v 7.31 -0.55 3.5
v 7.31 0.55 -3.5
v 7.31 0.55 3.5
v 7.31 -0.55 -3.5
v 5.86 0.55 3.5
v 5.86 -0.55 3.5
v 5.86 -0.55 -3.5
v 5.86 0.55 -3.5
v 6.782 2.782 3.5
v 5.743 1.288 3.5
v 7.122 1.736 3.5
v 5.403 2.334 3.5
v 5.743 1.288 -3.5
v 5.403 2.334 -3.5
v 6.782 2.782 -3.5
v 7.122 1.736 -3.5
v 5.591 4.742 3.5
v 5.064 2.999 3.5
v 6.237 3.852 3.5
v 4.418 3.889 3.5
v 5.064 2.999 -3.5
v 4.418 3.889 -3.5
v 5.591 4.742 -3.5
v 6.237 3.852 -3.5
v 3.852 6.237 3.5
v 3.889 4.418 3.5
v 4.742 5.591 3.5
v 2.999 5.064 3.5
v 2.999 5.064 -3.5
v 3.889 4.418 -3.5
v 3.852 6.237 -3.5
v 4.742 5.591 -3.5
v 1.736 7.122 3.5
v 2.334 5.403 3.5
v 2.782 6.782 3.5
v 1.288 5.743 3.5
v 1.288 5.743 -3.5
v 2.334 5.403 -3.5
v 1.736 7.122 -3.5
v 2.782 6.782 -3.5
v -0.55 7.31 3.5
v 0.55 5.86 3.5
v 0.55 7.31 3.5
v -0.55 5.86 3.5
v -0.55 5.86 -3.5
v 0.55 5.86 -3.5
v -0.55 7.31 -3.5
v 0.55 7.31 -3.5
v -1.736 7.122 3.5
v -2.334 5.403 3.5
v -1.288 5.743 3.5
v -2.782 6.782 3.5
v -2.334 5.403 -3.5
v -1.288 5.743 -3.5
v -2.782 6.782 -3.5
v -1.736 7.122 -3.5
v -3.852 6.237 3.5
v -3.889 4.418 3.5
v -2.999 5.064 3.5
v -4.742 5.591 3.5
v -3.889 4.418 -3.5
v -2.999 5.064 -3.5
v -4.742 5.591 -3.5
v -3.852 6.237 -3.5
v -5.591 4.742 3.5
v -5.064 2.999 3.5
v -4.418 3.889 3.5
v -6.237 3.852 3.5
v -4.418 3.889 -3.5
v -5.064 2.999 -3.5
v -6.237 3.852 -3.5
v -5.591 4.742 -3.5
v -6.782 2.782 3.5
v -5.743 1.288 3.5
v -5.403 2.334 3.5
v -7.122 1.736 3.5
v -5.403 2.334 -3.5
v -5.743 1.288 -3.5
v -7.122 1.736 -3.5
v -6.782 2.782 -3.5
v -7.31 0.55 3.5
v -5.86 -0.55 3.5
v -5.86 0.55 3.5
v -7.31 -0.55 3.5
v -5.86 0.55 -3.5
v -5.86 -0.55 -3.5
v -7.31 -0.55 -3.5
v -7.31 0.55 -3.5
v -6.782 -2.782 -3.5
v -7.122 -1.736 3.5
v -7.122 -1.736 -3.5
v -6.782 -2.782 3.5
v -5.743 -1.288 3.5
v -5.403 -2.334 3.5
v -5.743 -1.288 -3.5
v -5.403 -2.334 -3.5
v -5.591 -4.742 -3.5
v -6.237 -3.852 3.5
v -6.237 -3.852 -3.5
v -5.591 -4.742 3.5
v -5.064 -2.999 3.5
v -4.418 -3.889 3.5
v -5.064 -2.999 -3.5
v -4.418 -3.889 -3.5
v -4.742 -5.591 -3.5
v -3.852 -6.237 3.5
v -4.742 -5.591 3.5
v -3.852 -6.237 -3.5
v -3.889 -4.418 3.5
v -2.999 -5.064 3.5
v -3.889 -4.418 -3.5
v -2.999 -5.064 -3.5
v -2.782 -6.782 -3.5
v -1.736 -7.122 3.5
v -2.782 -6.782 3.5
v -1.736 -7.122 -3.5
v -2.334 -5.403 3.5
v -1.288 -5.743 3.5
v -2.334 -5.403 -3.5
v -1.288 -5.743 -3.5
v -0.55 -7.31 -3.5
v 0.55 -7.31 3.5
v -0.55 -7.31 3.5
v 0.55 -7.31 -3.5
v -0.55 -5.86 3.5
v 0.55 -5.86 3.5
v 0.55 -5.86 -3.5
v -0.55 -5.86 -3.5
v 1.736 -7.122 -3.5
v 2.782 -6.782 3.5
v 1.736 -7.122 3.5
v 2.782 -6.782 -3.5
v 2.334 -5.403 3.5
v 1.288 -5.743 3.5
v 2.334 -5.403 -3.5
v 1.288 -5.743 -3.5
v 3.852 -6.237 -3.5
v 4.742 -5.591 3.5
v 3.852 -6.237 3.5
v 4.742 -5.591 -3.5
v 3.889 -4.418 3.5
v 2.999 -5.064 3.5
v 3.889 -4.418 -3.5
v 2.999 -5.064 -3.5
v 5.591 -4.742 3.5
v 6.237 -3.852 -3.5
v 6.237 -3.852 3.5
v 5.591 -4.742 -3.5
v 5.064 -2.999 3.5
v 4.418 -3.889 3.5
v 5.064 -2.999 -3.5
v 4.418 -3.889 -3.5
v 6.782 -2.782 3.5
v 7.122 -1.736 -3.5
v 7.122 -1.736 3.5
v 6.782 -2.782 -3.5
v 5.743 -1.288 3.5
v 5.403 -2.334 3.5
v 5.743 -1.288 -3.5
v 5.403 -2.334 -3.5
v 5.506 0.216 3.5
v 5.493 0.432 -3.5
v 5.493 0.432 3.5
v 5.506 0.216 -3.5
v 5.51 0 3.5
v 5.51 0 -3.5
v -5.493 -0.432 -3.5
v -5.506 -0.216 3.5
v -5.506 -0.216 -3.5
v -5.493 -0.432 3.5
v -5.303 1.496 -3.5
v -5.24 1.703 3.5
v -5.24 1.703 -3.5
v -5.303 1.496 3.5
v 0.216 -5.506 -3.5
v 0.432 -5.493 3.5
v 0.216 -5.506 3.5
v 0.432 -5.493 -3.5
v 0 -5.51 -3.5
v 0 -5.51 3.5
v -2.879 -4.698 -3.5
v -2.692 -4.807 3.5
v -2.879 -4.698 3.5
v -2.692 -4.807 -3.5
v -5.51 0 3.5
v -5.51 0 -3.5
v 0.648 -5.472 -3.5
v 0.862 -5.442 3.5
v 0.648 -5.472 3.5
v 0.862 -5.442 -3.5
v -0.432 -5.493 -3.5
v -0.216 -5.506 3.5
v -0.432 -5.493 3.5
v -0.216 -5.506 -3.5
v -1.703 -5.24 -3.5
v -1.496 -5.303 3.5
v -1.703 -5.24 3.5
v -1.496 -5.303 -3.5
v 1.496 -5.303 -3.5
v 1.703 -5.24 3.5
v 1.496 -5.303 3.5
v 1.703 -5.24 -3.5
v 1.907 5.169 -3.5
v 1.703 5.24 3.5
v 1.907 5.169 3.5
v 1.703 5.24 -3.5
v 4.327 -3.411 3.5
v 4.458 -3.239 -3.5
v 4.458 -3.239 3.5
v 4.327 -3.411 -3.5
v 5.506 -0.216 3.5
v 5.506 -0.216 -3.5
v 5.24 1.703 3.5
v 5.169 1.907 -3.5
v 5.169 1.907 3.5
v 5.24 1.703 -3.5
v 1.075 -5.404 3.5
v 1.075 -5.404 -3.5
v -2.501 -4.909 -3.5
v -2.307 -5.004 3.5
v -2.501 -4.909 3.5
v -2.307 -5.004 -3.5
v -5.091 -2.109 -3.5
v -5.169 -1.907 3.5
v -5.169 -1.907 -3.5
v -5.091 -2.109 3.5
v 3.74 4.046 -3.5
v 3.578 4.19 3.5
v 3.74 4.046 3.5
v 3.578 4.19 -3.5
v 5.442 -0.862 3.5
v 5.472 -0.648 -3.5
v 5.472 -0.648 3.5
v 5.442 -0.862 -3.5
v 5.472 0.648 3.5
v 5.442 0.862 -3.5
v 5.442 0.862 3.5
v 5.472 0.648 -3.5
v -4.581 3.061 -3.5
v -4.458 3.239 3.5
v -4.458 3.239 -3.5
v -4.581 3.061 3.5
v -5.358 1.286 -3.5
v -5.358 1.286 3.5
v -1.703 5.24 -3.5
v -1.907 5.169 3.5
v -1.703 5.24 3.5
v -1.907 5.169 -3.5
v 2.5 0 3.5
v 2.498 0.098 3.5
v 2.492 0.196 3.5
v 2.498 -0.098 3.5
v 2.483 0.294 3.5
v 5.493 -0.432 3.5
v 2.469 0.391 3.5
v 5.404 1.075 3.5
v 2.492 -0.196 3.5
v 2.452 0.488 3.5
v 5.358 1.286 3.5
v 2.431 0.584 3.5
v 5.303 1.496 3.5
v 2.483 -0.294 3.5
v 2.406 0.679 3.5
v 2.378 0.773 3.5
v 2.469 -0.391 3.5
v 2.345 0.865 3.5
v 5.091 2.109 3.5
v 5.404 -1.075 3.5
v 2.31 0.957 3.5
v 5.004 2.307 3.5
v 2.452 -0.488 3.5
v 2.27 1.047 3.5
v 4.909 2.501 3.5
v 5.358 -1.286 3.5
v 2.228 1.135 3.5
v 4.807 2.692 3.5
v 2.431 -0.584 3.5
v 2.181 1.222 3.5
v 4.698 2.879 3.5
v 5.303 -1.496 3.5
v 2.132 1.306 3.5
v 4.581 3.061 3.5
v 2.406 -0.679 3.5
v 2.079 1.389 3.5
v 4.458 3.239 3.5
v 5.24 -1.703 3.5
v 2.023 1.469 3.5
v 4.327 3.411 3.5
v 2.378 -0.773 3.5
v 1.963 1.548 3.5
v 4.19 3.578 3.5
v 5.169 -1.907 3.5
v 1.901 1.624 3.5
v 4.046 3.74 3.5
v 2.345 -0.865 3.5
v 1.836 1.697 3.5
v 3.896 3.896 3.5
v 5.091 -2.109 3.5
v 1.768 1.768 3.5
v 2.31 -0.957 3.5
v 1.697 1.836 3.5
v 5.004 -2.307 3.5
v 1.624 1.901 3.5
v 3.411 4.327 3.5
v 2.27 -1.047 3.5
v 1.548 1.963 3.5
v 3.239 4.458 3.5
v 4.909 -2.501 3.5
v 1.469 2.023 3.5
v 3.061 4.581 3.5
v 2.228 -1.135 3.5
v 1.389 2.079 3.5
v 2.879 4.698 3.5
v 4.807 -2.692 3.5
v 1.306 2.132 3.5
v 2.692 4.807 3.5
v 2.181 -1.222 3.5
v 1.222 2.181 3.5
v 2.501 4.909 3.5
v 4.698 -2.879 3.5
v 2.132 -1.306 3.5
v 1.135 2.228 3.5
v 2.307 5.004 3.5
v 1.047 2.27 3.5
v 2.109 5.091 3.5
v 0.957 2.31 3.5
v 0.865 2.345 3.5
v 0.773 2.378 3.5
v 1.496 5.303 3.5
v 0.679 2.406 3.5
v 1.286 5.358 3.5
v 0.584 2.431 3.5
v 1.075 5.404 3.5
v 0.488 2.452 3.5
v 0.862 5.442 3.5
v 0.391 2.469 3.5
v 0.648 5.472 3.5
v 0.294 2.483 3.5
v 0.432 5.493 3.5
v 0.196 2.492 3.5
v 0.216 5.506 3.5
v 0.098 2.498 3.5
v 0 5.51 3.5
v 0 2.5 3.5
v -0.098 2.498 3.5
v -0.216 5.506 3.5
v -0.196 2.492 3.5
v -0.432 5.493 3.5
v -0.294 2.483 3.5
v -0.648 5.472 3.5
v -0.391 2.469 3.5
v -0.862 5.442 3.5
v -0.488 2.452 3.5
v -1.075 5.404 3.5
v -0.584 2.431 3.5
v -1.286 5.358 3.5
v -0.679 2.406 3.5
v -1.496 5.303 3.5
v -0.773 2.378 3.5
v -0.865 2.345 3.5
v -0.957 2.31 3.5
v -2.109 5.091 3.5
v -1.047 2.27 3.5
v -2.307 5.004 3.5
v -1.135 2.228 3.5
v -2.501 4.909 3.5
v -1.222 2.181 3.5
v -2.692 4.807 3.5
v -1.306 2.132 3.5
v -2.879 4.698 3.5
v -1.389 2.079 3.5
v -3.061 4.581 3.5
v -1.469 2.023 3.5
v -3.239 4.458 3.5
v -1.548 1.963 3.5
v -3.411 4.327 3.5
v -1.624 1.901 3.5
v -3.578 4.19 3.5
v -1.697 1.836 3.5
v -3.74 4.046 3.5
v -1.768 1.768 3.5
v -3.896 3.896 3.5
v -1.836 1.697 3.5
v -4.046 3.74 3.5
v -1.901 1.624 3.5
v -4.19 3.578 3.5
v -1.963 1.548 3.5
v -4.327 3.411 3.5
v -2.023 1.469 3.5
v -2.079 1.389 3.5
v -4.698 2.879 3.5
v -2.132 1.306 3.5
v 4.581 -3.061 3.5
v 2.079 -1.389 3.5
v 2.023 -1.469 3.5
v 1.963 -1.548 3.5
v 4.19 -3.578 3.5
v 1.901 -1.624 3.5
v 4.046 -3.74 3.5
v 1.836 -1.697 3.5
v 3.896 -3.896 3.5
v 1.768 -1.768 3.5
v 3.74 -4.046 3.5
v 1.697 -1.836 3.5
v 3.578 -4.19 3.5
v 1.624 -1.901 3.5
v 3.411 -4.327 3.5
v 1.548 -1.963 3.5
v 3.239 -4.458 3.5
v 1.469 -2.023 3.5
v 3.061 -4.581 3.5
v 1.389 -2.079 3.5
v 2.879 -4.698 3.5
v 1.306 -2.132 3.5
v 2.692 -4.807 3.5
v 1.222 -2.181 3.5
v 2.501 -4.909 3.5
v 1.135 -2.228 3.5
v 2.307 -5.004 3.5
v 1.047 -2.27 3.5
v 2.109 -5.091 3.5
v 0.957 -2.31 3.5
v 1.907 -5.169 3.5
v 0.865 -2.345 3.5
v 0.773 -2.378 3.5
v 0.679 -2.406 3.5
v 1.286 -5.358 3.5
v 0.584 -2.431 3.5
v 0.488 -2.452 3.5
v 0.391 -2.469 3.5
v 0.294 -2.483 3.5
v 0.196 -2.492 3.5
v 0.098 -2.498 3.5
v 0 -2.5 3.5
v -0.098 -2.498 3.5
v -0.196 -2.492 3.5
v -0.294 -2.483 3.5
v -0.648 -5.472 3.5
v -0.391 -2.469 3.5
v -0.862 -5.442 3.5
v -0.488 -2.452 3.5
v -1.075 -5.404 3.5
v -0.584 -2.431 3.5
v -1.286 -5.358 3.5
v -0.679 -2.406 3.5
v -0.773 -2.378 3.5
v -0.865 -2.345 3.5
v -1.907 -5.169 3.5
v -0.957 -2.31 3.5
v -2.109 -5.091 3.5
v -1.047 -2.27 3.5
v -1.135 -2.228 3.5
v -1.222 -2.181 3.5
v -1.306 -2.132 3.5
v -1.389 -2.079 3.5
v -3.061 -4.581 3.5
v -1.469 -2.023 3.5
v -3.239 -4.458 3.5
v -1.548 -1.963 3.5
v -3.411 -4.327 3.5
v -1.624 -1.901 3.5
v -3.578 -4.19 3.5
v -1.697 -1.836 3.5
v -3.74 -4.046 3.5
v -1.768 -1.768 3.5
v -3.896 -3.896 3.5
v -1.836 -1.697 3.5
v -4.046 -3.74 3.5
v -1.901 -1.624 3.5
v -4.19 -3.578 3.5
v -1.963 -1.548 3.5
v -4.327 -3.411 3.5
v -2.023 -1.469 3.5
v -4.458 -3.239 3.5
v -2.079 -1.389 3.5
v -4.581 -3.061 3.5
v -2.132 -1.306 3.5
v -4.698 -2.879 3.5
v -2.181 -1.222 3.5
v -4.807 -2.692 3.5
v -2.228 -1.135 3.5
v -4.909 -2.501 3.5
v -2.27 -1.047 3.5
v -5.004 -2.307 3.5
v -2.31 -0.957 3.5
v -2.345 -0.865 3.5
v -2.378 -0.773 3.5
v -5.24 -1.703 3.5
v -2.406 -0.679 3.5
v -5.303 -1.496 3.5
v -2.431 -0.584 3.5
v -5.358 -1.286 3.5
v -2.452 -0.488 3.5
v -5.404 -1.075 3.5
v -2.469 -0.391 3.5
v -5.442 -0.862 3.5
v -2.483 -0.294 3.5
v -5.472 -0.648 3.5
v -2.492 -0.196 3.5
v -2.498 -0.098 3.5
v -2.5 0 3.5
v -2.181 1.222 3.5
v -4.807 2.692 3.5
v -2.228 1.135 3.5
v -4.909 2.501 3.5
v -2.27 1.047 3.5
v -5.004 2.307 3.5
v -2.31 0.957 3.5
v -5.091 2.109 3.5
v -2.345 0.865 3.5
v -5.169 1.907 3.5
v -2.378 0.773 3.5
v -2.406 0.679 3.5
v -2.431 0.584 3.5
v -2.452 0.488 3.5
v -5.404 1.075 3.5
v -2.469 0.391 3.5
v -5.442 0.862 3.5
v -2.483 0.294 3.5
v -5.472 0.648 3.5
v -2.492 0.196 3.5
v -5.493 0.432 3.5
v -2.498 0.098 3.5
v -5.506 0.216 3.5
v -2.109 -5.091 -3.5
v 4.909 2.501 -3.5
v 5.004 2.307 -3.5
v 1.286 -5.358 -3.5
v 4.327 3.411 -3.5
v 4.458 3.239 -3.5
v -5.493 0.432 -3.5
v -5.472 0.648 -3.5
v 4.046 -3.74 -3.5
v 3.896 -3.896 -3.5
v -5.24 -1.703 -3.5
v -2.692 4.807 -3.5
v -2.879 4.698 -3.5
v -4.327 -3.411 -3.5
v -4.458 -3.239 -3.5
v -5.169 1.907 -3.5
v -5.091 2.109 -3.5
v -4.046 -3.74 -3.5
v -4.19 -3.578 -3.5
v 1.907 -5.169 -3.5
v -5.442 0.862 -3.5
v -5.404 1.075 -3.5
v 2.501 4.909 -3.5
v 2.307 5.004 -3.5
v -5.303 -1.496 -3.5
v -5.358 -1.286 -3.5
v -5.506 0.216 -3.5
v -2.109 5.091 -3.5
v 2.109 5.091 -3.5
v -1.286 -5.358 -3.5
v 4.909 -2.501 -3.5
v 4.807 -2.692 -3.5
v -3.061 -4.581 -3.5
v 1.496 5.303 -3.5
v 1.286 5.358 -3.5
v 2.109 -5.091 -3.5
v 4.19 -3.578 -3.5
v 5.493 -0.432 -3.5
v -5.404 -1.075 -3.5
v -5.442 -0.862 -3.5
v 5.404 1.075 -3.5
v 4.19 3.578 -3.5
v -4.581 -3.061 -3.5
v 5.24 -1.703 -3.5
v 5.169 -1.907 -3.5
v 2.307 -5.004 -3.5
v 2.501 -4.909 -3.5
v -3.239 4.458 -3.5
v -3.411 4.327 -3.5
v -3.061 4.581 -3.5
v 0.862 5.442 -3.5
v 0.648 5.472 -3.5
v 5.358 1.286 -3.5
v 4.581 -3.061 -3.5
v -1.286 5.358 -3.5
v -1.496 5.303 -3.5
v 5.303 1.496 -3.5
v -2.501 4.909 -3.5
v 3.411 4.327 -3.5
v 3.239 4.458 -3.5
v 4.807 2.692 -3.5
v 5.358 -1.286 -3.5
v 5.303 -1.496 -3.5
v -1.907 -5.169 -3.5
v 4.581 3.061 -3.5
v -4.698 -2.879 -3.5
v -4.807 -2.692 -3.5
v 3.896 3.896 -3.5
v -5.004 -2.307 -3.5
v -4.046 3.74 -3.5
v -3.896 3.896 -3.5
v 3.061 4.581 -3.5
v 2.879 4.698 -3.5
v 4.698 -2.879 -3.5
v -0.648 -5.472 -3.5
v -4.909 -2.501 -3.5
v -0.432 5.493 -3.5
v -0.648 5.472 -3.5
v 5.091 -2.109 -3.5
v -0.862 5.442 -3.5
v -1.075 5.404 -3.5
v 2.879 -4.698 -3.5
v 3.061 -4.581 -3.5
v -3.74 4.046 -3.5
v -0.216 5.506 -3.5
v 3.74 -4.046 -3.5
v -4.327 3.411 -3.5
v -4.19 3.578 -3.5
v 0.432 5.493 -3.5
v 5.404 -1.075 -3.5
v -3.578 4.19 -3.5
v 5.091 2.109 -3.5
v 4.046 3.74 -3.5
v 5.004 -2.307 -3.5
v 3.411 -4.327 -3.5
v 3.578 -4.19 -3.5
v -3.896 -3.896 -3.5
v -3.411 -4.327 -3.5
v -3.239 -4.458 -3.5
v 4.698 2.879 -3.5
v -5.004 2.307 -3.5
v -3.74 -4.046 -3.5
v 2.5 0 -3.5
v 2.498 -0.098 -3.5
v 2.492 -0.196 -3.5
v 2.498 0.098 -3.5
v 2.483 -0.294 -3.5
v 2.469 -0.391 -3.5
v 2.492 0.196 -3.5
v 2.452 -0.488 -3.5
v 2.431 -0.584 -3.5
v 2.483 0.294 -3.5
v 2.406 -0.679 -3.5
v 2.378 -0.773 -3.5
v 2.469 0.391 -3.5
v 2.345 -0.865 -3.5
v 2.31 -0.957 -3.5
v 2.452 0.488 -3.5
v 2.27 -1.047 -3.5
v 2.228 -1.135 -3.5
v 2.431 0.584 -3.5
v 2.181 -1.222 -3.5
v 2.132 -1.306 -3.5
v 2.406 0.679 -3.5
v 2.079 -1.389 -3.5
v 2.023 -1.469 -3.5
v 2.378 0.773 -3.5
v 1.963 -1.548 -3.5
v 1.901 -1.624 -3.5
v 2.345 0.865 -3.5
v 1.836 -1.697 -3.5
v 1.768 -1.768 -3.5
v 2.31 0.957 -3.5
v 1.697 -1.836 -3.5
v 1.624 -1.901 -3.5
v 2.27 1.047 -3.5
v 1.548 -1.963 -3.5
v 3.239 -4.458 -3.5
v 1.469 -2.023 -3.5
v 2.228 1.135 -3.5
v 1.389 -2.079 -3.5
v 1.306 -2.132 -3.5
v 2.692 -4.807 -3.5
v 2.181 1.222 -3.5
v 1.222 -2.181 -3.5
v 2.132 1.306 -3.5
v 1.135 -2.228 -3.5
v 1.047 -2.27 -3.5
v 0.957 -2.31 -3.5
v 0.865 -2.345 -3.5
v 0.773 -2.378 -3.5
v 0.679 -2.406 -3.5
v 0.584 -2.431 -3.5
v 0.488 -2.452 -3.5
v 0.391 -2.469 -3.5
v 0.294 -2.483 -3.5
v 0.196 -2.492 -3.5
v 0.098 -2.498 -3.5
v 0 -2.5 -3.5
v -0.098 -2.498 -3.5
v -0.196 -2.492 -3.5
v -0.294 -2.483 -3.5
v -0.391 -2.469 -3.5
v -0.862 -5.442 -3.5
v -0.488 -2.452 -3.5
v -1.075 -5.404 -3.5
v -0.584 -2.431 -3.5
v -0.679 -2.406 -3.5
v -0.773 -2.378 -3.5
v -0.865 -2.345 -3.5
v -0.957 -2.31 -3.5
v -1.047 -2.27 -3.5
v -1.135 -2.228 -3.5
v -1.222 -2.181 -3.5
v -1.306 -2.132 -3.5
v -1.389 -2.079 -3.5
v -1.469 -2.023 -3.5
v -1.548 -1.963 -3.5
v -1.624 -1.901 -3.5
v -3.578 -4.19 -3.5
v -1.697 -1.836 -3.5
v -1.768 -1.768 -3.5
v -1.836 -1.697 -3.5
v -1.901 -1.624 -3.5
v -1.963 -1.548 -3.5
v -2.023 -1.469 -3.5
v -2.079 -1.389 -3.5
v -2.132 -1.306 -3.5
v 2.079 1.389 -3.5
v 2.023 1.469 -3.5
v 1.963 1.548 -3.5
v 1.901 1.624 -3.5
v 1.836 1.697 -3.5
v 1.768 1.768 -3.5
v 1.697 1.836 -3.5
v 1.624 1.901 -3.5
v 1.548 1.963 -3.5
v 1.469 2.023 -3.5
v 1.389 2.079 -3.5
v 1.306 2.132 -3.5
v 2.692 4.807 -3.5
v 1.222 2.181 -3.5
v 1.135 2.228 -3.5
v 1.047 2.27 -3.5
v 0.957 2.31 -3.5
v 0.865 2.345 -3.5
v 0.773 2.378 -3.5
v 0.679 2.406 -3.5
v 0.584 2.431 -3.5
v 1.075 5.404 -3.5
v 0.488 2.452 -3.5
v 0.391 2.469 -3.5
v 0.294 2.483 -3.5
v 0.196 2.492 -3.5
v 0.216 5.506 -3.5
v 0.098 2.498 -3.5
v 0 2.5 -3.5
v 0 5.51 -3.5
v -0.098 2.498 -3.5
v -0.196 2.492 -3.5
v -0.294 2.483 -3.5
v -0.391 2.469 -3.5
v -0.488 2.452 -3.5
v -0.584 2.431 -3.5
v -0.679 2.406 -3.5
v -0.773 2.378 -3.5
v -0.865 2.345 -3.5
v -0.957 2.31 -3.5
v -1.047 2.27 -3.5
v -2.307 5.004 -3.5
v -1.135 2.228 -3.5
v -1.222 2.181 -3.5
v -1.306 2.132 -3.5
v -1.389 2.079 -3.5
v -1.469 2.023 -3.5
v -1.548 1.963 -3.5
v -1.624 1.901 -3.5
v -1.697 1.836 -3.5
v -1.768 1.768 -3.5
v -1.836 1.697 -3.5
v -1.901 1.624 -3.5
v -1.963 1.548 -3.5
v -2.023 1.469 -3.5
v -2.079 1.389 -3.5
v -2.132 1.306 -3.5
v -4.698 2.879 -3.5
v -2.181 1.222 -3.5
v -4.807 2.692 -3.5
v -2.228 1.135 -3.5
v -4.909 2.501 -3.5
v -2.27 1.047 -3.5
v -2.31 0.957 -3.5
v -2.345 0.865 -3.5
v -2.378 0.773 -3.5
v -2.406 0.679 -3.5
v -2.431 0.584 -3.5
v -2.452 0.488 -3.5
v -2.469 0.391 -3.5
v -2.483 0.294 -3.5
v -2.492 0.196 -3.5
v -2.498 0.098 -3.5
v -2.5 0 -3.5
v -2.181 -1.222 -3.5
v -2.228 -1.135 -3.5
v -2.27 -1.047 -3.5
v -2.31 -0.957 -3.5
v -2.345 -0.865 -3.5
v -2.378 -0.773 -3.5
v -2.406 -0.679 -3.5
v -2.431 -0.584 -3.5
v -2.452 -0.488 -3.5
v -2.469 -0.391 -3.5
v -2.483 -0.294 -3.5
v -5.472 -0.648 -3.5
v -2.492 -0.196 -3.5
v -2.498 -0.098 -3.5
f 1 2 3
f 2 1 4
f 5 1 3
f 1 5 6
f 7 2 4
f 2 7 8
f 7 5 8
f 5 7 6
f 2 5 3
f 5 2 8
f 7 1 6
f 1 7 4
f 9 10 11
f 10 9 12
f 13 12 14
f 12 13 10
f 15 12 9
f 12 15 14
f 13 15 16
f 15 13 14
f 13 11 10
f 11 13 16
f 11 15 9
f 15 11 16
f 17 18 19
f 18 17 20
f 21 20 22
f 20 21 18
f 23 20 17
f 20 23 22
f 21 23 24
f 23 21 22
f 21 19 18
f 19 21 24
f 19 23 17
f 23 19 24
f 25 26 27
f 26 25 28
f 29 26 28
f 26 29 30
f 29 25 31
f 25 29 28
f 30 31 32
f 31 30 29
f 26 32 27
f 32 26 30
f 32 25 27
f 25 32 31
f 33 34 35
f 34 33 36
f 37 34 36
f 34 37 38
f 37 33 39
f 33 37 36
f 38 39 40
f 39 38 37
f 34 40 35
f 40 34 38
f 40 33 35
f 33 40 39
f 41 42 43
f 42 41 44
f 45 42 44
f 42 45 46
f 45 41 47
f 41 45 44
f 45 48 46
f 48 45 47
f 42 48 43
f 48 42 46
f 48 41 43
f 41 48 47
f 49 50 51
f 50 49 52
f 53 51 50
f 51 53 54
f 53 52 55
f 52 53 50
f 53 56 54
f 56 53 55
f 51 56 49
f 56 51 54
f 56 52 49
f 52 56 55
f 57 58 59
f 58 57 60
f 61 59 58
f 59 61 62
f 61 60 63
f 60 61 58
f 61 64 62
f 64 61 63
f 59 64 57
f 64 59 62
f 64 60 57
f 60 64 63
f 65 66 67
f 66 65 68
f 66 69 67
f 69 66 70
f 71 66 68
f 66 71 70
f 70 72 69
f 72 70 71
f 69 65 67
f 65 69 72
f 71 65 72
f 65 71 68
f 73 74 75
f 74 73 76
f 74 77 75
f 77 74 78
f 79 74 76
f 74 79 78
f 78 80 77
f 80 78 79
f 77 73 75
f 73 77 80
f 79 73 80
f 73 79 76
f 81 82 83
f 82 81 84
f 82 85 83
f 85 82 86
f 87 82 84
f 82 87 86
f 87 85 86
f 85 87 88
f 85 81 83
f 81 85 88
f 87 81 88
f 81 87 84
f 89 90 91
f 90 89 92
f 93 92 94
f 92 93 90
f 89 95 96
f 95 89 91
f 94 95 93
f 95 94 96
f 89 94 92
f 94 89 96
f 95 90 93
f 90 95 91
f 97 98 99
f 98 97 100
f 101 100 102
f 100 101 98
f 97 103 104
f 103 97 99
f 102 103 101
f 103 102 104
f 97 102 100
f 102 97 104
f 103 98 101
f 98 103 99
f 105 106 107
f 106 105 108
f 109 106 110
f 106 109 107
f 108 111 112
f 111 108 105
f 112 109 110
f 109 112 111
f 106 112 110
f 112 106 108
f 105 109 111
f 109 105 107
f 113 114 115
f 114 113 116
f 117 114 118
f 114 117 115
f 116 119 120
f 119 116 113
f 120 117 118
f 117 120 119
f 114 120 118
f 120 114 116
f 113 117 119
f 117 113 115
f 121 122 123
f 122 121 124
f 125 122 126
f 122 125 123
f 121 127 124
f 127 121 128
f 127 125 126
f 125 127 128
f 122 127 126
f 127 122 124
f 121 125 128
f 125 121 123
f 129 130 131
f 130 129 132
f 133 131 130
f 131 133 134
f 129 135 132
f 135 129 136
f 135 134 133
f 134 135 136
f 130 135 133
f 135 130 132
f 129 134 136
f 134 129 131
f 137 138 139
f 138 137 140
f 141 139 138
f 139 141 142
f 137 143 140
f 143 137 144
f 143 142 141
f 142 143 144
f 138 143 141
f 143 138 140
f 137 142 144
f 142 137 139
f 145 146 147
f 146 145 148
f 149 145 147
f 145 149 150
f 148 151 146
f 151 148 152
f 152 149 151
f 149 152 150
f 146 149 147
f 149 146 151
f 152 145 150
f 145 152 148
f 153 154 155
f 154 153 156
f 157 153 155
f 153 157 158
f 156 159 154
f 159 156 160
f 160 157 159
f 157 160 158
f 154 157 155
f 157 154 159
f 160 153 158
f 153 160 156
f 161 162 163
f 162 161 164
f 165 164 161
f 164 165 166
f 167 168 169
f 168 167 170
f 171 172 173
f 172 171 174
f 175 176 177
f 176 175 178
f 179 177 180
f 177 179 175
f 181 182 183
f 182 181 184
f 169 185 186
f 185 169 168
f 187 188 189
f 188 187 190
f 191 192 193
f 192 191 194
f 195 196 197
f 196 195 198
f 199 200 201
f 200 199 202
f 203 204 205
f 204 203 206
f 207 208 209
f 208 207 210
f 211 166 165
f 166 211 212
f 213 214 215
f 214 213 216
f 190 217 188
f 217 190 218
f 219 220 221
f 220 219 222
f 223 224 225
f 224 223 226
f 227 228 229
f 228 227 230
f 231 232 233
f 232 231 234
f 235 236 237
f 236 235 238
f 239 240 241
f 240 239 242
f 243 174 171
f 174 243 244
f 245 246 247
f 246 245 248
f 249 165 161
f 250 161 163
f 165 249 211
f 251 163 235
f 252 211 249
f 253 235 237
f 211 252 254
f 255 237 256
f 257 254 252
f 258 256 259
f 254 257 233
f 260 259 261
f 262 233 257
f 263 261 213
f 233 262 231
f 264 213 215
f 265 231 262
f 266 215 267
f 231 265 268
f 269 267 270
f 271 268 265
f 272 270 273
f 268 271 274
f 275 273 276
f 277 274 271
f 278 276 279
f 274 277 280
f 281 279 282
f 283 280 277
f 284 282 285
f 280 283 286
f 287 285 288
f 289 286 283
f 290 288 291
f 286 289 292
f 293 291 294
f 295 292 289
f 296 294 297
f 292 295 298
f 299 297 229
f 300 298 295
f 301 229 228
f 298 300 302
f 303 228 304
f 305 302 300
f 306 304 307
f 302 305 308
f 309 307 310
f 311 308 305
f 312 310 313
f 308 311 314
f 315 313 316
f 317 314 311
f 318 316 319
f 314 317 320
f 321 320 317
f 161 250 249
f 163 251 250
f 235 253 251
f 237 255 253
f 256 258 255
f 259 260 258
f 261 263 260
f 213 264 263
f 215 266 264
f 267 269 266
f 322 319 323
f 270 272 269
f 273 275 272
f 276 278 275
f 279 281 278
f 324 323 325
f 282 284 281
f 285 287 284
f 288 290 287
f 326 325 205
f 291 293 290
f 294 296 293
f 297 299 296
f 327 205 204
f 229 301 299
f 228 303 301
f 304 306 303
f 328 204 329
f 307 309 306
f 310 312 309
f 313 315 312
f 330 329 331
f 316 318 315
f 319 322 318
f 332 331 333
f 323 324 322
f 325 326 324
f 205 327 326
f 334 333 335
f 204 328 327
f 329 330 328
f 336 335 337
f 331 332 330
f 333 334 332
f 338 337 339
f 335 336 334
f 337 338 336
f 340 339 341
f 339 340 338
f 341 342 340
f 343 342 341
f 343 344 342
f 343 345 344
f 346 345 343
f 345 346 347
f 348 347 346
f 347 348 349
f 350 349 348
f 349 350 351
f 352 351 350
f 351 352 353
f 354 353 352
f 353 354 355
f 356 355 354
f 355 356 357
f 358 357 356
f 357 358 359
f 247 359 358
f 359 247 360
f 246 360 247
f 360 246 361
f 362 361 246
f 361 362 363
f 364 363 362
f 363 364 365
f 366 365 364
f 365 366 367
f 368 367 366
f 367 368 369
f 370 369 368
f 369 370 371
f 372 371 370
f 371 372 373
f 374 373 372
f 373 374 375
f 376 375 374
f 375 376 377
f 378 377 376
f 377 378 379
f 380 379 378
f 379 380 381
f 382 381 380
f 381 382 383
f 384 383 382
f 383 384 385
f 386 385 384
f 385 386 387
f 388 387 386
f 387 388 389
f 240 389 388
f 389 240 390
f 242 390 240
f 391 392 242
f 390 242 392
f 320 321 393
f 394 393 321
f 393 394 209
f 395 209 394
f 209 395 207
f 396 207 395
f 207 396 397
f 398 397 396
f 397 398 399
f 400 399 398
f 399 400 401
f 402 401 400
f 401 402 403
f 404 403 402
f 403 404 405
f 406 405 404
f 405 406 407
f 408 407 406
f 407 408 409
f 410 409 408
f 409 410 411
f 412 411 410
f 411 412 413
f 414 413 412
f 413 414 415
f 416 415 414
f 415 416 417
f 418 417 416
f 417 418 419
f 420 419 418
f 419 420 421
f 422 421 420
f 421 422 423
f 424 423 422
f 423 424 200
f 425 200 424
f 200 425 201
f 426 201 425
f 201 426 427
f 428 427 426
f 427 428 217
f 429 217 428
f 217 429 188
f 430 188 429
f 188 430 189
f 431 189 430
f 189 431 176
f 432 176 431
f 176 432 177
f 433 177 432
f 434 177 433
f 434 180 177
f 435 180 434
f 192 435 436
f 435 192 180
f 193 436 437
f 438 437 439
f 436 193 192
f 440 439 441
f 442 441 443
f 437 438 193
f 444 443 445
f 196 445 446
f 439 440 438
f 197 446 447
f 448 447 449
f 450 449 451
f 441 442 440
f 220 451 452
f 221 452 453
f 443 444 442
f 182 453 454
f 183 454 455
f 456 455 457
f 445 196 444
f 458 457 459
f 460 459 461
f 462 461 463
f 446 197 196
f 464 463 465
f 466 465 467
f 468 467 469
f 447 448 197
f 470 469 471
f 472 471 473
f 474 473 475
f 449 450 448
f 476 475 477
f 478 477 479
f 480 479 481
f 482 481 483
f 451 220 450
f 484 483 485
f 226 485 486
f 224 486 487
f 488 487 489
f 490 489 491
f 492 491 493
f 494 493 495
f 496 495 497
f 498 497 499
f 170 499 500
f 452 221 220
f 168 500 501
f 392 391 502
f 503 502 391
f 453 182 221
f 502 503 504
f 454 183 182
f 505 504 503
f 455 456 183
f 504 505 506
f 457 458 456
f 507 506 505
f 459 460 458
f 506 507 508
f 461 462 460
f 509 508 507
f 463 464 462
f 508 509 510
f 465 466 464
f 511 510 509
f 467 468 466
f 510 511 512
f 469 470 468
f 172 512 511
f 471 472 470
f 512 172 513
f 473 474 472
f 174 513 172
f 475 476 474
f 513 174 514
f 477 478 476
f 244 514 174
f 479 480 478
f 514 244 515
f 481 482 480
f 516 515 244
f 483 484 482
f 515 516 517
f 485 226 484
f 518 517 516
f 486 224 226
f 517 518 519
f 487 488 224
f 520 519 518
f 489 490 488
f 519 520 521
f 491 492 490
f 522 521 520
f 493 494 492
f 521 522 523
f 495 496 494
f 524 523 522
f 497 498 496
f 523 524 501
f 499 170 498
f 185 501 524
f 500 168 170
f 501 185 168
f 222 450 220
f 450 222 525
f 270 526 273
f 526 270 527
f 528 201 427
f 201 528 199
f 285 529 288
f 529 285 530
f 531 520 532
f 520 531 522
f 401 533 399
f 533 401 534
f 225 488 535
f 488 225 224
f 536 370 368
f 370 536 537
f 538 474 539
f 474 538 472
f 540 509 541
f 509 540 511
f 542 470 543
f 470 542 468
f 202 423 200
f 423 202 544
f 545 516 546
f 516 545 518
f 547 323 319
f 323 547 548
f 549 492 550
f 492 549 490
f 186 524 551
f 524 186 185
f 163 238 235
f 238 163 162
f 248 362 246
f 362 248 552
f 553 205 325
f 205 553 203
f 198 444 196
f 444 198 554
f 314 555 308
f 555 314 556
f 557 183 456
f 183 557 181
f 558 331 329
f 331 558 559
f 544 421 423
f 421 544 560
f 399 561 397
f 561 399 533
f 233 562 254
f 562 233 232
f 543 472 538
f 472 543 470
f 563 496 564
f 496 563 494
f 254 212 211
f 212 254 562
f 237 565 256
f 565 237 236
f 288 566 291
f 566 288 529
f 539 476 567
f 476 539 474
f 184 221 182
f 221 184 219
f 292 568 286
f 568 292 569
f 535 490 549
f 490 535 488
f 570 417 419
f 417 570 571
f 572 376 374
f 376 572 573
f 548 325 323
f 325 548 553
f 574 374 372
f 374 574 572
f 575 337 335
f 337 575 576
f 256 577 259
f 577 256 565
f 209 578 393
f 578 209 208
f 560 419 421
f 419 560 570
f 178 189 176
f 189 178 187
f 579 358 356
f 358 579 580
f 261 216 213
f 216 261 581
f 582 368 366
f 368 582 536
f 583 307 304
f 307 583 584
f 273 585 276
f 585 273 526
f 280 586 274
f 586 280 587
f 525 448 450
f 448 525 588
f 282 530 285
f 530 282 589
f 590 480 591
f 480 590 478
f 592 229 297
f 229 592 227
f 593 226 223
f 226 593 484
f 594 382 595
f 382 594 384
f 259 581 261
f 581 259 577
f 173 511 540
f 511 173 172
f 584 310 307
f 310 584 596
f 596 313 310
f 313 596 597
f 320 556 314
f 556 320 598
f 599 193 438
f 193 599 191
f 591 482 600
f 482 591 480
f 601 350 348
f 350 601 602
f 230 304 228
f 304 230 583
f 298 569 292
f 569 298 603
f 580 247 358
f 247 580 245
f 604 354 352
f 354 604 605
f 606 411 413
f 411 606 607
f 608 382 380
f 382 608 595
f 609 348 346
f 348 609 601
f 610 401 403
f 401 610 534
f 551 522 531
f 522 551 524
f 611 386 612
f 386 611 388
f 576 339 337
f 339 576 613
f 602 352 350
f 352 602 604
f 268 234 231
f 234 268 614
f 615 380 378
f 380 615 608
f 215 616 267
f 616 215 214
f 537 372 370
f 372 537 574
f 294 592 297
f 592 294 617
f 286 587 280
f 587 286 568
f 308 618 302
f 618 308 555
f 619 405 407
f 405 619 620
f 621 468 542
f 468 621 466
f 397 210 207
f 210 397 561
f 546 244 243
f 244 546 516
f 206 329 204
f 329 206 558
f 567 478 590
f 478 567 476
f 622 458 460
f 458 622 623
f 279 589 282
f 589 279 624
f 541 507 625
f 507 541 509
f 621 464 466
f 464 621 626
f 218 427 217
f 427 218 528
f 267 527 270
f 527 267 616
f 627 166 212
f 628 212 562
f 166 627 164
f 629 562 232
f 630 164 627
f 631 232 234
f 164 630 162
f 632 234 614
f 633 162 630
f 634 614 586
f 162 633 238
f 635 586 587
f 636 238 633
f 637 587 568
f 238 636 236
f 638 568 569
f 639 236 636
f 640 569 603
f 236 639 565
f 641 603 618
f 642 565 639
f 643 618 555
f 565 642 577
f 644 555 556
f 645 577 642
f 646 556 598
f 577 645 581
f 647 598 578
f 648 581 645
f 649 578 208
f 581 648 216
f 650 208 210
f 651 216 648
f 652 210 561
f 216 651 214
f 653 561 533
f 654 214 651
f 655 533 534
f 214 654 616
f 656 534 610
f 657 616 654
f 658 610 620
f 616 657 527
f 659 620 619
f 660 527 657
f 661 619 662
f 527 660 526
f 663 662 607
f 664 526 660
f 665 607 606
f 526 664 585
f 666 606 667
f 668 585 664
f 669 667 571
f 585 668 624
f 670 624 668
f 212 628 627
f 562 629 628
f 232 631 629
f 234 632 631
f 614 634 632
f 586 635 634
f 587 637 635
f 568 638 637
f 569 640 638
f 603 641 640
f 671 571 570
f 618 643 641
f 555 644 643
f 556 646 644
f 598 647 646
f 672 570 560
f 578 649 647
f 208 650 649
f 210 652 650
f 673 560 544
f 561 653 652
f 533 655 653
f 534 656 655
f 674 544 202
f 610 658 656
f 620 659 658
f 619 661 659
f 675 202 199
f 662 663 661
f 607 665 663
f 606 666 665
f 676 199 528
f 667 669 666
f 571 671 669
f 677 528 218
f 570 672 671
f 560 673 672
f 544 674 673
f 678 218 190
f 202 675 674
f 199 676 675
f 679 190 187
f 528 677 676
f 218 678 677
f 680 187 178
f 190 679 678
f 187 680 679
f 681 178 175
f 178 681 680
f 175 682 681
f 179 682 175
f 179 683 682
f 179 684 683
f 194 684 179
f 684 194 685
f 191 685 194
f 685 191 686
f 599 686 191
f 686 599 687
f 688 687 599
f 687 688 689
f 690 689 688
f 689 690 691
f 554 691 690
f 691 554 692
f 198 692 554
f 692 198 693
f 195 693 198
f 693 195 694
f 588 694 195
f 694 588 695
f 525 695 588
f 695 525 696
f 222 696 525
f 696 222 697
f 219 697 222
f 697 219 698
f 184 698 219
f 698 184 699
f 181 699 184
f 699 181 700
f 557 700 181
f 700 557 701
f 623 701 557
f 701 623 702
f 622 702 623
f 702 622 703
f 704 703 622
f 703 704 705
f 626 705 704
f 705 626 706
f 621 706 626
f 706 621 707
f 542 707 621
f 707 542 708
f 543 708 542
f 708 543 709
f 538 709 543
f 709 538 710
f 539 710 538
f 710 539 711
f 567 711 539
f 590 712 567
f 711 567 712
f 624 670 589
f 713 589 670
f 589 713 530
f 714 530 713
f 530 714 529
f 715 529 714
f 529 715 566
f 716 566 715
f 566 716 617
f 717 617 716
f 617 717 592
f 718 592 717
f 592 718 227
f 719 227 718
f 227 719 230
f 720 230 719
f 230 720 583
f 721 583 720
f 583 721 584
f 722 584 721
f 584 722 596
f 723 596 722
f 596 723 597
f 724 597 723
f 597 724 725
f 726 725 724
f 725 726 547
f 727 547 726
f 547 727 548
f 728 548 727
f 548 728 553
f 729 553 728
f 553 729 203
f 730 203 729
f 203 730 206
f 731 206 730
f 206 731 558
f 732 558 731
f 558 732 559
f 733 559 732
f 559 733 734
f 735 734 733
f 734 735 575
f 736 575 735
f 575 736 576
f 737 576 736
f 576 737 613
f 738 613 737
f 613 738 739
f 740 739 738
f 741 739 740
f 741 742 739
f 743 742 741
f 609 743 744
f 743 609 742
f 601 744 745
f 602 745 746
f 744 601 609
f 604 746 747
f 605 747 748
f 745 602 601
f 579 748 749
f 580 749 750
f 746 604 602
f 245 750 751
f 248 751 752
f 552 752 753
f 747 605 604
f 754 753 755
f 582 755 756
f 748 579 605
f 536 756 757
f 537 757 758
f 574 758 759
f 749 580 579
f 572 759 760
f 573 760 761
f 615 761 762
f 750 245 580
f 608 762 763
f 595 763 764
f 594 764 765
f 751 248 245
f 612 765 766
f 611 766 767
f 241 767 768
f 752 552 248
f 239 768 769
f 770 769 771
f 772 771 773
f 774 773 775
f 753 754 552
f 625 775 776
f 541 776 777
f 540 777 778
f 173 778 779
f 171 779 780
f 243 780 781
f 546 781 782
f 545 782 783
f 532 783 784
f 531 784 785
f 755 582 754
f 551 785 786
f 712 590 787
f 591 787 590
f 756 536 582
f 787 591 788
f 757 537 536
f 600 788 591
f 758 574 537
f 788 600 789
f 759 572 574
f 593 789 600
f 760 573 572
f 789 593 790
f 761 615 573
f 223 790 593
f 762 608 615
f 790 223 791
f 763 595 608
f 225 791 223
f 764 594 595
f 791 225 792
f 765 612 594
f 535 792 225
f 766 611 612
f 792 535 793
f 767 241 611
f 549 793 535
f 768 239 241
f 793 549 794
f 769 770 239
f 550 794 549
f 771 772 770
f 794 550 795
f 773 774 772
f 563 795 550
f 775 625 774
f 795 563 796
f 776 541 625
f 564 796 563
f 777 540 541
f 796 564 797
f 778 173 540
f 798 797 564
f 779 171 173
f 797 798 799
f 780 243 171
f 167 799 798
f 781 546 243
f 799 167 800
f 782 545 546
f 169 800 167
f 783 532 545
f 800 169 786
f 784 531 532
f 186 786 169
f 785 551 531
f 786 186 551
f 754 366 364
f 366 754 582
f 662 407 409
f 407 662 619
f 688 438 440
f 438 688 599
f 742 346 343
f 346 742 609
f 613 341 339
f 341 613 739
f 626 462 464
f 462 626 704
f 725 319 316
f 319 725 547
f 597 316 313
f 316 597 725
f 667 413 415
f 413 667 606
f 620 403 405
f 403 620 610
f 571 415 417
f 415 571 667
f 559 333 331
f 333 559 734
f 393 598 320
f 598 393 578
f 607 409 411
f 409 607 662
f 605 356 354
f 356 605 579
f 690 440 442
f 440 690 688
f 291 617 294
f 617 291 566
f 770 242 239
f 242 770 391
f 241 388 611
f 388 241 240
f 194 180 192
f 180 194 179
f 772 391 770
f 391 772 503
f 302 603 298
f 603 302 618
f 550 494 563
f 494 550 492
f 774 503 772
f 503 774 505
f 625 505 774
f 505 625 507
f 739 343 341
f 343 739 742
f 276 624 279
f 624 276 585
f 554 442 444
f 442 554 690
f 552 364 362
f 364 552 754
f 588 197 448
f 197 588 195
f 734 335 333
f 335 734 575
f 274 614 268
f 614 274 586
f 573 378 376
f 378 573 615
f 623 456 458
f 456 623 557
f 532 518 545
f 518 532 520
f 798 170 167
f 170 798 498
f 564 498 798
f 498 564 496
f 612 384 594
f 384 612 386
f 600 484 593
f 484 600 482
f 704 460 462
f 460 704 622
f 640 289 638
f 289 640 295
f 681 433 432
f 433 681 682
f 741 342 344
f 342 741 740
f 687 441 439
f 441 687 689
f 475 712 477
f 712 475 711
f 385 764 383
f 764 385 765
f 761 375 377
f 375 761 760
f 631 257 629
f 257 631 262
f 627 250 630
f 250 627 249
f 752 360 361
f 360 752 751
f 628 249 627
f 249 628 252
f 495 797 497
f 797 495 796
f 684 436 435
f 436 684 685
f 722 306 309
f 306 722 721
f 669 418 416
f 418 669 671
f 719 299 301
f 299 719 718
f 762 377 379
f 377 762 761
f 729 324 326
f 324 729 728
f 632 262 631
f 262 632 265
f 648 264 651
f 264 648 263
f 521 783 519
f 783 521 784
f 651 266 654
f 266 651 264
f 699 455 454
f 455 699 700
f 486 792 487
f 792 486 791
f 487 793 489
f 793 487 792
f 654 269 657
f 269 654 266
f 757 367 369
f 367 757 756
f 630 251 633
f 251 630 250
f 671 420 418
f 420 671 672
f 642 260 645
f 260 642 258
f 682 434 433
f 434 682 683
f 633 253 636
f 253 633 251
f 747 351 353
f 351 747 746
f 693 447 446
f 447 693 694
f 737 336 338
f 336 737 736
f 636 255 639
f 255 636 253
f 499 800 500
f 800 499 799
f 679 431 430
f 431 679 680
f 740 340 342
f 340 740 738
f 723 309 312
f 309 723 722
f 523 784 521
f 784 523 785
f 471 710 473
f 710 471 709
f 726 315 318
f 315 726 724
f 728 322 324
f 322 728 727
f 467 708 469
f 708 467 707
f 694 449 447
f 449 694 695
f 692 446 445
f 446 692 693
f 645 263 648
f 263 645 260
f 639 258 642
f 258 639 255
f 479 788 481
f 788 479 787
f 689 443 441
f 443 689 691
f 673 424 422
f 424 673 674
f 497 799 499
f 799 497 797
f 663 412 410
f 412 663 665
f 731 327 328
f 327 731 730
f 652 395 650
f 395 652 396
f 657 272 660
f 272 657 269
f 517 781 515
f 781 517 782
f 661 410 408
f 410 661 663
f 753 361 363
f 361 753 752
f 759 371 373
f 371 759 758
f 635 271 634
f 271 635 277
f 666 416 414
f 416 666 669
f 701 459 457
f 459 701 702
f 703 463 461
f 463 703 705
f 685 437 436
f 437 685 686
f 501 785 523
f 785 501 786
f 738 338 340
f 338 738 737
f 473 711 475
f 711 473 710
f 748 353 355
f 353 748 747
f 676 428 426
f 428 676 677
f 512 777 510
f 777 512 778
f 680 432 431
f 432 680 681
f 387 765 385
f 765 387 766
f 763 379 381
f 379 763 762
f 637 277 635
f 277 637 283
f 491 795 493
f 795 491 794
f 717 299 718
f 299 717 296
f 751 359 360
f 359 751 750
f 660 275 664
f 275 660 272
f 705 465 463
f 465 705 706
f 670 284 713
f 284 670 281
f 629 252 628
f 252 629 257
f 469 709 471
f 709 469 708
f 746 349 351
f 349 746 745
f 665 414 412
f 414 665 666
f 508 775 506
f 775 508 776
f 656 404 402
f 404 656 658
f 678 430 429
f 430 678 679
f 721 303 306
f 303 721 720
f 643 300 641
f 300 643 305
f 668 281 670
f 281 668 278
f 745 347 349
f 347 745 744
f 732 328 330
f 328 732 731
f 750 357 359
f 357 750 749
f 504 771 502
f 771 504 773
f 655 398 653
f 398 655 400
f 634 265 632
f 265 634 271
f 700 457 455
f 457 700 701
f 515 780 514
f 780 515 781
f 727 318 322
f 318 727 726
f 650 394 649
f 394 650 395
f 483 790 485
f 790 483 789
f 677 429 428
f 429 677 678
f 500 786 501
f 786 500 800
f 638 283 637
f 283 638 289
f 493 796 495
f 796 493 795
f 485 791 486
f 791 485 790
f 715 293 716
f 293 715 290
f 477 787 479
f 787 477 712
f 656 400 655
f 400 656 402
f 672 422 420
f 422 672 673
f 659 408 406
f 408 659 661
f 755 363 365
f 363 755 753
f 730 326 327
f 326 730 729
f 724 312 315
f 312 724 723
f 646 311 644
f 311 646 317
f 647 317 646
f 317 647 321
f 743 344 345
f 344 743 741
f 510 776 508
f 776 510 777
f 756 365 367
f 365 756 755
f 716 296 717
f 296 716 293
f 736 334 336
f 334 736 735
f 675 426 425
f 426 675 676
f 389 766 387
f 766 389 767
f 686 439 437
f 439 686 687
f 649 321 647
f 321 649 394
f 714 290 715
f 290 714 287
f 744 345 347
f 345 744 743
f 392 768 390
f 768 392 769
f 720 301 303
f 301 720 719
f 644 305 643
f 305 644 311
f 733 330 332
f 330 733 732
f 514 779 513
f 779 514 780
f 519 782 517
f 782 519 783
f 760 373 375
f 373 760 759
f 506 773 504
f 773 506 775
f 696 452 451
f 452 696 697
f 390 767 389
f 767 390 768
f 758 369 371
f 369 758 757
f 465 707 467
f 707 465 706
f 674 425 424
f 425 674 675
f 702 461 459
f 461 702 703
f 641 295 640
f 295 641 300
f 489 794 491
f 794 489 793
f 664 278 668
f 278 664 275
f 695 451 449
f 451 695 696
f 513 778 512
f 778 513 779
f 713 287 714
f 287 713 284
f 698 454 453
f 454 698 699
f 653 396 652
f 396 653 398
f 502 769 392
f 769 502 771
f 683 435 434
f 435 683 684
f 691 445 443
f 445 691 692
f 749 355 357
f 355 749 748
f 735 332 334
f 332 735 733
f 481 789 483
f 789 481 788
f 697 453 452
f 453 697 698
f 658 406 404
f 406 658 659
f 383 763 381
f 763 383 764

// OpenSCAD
// Timing pulley: 20 teeth, 12.22mm pitch diameter
// Single connected solid, no extra hub/flanges. Teeth are visible in orthographic views.

$fn = 160;

// --- Required specs ---
tooth_count = 20;
pitch_diameter_mm = 12.22;
pitch_radius_mm = pitch_diameter_mm/2;

// --- Simple printable timing-tooth approximation (rectangular teeth) ---
pulley_width_mm = 7;
tooth_radial_height_mm = 1.2;        // tooth height above pitch circle
tooth_tangential_width_mm = 1.1;     // tooth thickness around circumference
root_clearance_mm = 0.6;             // body radius below pitch circle
bore_diameter_mm = 5;

// Connectivity/robustness
overlap_mm = 0.25;                   // small overlap to guarantee union/difference connectivity

// Derived radii
root_radius_mm = pitch_radius_mm - root_clearance_mm;   // base cylinder radius
outer_radius_mm = pitch_radius_mm + tooth_radial_height_mm;

// --- Modules ---
module pulley_solid() {
    difference() {
        union() {
            // Base body (root cylinder)
            cylinder(h=pulley_width_mm, r=root_radius_mm, center=true);

            // Teeth: protrude outward from pitch circle, overlap into body for connectivity
            for (i = [0:tooth_count-1]) {
                rotate([0, 0, i * 360/tooth_count])
                    translate([pitch_radius_mm + tooth_radial_height_mm/2 - overlap_mm/2, 0, 0])
                        cube([tooth_radial_height_mm + overlap_mm, tooth_tangential_width_mm, pulley_width_mm], center=true);
            }
        }

        // Bore through entire pulley (slightly longer to ensure clean cut)
        cylinder(h=pulley_width_mm + 2*overlap_mm, r=bore_diameter_mm/2, center=true);
    }
}

pulley_solid();
